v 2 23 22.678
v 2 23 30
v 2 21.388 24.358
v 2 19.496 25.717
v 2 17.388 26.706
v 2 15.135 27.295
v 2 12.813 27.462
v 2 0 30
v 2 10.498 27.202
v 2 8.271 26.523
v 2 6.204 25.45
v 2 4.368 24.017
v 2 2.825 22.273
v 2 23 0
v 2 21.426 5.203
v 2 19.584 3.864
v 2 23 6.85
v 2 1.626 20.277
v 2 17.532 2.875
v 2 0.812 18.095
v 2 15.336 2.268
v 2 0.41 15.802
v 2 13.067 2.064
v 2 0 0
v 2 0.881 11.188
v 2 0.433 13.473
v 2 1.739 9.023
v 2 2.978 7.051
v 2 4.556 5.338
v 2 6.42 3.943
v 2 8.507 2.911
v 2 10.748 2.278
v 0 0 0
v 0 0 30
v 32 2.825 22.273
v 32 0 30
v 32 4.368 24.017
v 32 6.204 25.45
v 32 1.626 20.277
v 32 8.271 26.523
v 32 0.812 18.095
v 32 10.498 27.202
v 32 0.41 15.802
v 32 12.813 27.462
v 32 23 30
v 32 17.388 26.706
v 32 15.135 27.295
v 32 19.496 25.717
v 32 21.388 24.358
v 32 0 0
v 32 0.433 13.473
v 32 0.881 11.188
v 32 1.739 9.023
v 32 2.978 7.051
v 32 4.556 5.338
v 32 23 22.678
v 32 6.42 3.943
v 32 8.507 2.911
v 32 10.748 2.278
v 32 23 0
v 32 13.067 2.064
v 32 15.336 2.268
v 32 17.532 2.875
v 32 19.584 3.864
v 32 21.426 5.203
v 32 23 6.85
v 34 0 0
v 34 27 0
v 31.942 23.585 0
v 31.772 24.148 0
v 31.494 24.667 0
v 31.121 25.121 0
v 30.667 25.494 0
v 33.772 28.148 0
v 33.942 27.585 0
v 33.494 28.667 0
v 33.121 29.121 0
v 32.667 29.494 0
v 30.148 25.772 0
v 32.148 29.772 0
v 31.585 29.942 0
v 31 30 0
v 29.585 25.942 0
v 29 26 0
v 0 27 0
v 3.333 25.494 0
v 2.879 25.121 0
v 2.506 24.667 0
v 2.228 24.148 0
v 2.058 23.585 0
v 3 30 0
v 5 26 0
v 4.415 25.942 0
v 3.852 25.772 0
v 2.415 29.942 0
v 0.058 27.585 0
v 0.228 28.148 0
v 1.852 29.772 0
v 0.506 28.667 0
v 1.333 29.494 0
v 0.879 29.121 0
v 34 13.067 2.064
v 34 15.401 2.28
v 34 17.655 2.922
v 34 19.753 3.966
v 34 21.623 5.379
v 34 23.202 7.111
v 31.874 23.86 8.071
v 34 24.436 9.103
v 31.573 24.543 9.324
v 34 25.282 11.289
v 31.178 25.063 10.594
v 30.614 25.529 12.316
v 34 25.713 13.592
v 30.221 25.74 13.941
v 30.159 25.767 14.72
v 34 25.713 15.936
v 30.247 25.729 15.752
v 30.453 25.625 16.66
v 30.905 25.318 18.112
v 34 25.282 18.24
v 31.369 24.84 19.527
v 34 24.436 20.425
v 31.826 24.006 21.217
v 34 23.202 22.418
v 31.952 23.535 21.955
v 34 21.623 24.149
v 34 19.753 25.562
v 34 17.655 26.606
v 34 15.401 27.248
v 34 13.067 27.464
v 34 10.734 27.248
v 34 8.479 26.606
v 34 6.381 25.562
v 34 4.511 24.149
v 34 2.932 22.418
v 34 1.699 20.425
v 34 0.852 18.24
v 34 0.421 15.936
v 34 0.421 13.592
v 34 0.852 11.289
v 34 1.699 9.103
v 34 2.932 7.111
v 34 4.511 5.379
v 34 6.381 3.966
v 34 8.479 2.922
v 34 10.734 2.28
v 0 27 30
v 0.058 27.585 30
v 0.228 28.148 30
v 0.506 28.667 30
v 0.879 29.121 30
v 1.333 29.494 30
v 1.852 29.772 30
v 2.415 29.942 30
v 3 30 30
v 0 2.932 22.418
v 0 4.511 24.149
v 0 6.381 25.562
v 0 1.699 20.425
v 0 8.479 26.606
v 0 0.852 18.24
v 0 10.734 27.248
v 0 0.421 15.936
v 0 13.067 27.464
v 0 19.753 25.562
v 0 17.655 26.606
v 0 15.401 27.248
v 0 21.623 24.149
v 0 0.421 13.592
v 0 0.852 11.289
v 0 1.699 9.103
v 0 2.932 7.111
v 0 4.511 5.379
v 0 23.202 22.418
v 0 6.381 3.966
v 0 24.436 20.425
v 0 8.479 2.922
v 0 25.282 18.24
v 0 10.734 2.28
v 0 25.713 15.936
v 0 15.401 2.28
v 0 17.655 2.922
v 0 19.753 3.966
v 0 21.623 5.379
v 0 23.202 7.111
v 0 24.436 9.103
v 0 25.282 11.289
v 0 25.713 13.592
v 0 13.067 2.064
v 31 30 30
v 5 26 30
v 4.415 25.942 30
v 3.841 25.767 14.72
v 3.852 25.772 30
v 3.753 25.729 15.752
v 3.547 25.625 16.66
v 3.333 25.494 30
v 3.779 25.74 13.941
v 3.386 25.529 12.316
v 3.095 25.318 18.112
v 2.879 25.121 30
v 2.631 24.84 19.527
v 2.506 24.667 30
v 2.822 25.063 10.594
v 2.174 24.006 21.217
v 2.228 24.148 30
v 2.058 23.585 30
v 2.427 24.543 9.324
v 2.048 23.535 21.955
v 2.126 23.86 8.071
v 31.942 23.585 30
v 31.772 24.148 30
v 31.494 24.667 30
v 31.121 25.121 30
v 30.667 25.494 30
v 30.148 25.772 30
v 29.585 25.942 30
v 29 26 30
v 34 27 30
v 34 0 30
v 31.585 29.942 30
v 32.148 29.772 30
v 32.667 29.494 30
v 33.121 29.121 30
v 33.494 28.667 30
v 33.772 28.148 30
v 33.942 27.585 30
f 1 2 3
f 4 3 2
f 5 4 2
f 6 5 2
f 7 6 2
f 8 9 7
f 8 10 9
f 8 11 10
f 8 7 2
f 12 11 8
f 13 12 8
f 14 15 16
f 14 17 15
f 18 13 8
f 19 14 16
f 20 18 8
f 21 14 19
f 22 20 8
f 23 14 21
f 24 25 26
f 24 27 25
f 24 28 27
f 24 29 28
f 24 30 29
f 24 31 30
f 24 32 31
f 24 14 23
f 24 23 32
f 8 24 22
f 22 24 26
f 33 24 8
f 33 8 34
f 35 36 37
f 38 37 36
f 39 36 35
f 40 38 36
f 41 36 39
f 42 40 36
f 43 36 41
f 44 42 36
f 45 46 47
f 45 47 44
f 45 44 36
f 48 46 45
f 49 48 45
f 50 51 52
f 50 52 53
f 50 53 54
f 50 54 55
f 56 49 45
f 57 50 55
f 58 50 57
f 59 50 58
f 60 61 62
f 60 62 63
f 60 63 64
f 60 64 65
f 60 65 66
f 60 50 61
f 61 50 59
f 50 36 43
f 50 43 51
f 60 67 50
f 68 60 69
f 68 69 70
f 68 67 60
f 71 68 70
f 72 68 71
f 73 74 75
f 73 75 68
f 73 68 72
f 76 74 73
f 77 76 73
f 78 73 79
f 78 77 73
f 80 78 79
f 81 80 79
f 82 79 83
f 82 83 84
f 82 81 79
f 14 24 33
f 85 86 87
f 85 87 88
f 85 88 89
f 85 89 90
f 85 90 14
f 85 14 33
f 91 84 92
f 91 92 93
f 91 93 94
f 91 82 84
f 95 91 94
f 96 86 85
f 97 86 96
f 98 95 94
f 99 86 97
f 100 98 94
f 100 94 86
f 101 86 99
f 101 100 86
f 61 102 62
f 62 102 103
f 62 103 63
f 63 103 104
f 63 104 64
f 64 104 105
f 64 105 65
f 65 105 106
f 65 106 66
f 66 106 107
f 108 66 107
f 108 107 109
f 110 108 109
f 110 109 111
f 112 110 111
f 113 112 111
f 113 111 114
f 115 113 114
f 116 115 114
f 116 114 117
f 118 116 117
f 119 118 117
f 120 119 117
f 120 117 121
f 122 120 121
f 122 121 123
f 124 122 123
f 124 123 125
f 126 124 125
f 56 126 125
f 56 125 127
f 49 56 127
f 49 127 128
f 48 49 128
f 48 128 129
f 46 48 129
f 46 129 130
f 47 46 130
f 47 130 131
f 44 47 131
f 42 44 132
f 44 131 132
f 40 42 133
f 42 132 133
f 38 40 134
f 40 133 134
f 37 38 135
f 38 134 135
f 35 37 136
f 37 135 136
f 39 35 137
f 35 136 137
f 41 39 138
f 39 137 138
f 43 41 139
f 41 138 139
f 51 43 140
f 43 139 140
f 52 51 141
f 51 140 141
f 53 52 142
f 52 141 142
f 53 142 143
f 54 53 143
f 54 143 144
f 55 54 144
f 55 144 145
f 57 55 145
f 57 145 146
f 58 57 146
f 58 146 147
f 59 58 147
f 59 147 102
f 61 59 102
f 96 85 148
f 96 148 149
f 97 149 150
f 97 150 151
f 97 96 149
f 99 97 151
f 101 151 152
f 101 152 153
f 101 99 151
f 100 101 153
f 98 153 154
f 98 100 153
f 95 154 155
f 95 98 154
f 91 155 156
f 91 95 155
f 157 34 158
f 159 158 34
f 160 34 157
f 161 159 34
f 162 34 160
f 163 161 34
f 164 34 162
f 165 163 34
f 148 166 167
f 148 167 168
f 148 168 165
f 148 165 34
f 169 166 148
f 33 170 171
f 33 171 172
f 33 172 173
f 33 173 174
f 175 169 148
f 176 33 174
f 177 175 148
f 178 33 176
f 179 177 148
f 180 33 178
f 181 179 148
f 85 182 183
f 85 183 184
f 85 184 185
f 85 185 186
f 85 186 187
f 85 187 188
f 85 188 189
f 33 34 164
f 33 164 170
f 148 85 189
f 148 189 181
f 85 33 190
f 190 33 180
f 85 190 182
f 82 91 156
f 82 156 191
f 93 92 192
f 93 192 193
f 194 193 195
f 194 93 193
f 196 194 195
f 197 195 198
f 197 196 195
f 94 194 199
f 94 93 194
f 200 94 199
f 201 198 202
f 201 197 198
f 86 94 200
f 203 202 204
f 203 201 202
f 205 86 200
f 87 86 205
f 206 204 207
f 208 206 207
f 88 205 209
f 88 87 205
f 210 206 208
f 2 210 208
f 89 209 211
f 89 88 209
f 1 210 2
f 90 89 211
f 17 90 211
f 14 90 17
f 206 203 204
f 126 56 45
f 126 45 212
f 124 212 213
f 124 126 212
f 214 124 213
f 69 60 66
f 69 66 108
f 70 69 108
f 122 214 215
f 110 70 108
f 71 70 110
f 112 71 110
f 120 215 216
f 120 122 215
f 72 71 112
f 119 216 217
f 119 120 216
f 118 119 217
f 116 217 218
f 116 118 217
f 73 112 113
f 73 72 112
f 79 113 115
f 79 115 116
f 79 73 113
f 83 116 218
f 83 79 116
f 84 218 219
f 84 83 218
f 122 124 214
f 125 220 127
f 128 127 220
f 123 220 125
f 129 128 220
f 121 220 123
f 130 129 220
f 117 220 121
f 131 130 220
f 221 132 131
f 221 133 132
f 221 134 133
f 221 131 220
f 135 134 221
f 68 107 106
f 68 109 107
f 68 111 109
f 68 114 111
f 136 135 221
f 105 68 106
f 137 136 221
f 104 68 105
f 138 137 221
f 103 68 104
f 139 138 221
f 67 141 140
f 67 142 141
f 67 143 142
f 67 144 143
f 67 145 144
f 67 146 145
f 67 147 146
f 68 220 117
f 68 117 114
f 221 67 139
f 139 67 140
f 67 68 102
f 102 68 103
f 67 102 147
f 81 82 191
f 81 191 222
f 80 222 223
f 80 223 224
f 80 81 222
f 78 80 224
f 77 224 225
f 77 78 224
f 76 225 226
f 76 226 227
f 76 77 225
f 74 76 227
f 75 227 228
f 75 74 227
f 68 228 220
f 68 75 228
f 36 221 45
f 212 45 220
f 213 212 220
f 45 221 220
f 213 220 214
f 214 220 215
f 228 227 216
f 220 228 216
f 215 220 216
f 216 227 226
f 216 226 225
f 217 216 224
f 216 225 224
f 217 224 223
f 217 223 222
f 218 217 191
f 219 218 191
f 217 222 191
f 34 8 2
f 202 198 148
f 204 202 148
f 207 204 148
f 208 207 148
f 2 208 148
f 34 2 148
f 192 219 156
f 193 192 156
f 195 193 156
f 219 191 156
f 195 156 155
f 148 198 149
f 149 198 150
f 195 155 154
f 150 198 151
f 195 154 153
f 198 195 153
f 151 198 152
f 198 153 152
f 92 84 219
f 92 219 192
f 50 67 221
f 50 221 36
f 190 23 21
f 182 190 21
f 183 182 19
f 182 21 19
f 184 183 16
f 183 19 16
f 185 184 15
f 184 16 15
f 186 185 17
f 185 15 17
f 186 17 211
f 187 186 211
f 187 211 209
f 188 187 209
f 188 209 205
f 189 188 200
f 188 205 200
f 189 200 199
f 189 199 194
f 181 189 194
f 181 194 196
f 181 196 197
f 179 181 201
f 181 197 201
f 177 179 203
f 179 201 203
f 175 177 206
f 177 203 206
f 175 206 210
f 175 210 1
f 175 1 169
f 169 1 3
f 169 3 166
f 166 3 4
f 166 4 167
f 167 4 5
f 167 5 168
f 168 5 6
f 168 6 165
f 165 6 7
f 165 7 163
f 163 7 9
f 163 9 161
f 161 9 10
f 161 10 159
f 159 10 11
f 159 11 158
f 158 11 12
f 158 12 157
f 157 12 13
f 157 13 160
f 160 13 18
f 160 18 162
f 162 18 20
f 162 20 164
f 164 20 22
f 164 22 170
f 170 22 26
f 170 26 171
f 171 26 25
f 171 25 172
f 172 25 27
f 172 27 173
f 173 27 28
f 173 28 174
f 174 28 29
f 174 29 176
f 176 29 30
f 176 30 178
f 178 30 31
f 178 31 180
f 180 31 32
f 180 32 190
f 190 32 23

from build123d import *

# Parameters (mm, degrees)
BOSS_EXTRU_1_DEPTH = 30
PER_AGE1_D         = 25.4


with BuildPart() as part:
    # Esquisse1 → Boss.-Extru.1 (new body)
    with BuildSketch(Plane.XY):
        with BuildLine():
            Line((0, 0), (0, 27))
            ThreePointArc((0, 27), (0.878679656, 29.121320344), (3, 30))
            Line((3, 30), (31, 30))
            ThreePointArc((31, 30), (33.121320344, 29.121320344), (34, 27))
            Line((34, 27), (34, 0))
            Line((34, 0), (32, 0))
            Line((32, 0), (32, 23))
            ThreePointArc((32, 23), (31.121320344, 25.121320344), (29, 26))
            Line((29, 26), (5, 26))
            ThreePointArc((5, 26), (2.878679656, 25.121320344), (2, 23))
            Line((2, 23), (2, 0))
            Line((2, 0), (0, 0))
        make_face()
    extrude(amount=BOSS_EXTRU_1_DEPTH)

    # Perçage1 (through all)
    with Locations(Plane.ZY):
        with Locations((14.764081533, 13.067128835)):
            Hole(PER_AGE1_D / 2)


solid = part.part
